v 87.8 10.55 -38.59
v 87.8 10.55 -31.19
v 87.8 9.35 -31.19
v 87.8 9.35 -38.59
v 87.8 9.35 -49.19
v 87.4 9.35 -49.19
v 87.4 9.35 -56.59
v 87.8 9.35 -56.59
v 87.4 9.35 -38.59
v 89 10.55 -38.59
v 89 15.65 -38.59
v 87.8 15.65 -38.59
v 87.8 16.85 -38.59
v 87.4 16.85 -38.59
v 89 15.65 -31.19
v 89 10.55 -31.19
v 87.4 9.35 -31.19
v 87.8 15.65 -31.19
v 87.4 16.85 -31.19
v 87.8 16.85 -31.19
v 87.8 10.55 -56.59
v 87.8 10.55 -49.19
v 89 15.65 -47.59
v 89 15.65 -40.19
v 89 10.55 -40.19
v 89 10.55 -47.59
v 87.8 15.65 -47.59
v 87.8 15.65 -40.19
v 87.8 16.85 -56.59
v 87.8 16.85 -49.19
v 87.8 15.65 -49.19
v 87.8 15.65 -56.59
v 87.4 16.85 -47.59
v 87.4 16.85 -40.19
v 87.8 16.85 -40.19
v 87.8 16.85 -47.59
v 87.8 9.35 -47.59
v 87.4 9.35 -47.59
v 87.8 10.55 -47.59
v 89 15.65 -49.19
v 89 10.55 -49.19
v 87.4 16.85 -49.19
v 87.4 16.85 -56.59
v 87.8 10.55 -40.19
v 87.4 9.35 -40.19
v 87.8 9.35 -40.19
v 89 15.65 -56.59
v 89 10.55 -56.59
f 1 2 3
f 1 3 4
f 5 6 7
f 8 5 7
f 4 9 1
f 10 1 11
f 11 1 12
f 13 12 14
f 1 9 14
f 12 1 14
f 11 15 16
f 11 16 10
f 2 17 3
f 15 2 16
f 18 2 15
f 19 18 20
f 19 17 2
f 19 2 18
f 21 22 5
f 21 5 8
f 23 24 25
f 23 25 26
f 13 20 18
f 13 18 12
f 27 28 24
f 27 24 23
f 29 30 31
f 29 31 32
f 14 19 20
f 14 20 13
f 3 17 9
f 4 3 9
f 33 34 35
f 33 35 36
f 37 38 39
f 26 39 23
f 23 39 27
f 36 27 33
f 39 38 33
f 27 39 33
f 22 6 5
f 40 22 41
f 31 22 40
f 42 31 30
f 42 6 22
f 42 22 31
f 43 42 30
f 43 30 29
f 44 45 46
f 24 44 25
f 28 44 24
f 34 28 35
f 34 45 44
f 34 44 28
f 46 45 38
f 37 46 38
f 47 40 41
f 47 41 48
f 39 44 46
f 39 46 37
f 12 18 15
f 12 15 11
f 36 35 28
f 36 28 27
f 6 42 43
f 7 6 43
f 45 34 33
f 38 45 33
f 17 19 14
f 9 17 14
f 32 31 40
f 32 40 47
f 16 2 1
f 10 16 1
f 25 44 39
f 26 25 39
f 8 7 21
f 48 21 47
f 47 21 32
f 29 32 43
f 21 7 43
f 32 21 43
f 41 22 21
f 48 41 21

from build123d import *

# Parameters (mm, degrees)
AUFSATZ_LINEAR_START                = -0.4
AUFSATZ_LINEAR_AUSTRAGEN1_OUTLINE_W = 7.4
AUFSATZ_LINEAR_AUSTRAGEN1_OUTLINE_H = 7.5
AUFSATZ_LINEAR_AUSTRAGEN1_DEPTH     = 0.4
SKIZZE3_W                           = 7.4
SKIZZE3_H                           = 5.1
AUFSATZ_LINEAR_AUSTRAGEN2_DEPTH     = 1.2
LINEARES_MUSTER1_COUNT              = 3
LINEARES_MUSTER1_PITCH              = 9


# Read off the part's stored shape, not the designer's step: Aufsatz-Linear austragen1
with BuildPart() as part:
    # Aufsatz-Linear austragen1 outline → Aufsatz-Linear austragen1 (new body)
    with BuildSketch(Plane(origin=(87.8, 0, 0), x_dir=(0, 0, -1), z_dir=(1, 0, 0)).offset(AUFSATZ_LINEAR_START)):
        with Locations((34.89, 13.1)):
            Rectangle(AUFSATZ_LINEAR_AUSTRAGEN1_OUTLINE_W, AUFSATZ_LINEAR_AUSTRAGEN1_OUTLINE_H)
    extrude(amount=AUFSATZ_LINEAR_AUSTRAGEN1_DEPTH)

    # Skizze3 → Aufsatz-Linear austragen2 (add)
    with BuildSketch(Plane(origin=(87.8, 0, 0), x_dir=(0, 0, -1), z_dir=(1, 0, 0))):
        with Locations((34.89, 13.1)):
            Rectangle(SKIZZE3_W, SKIZZE3_H)
    extrude(amount=AUFSATZ_LINEAR_AUSTRAGEN2_DEPTH)


with BuildPart() as lineares_muster1_1:
    # Lineares Muster1: pattern copy
    add(part.part.moved(Location(Vector(0, 0, -1) * (1 * LINEARES_MUSTER1_PITCH))))


with BuildPart() as lineares_muster1_2:
    # Lineares Muster1: pattern copy
    add(part.part.moved(Location(Vector(0, 0, -1) * (2 * LINEARES_MUSTER1_PITCH))))


solid = Compound([part.part, lineares_muster1_1.part, lineares_muster1_2.part])
